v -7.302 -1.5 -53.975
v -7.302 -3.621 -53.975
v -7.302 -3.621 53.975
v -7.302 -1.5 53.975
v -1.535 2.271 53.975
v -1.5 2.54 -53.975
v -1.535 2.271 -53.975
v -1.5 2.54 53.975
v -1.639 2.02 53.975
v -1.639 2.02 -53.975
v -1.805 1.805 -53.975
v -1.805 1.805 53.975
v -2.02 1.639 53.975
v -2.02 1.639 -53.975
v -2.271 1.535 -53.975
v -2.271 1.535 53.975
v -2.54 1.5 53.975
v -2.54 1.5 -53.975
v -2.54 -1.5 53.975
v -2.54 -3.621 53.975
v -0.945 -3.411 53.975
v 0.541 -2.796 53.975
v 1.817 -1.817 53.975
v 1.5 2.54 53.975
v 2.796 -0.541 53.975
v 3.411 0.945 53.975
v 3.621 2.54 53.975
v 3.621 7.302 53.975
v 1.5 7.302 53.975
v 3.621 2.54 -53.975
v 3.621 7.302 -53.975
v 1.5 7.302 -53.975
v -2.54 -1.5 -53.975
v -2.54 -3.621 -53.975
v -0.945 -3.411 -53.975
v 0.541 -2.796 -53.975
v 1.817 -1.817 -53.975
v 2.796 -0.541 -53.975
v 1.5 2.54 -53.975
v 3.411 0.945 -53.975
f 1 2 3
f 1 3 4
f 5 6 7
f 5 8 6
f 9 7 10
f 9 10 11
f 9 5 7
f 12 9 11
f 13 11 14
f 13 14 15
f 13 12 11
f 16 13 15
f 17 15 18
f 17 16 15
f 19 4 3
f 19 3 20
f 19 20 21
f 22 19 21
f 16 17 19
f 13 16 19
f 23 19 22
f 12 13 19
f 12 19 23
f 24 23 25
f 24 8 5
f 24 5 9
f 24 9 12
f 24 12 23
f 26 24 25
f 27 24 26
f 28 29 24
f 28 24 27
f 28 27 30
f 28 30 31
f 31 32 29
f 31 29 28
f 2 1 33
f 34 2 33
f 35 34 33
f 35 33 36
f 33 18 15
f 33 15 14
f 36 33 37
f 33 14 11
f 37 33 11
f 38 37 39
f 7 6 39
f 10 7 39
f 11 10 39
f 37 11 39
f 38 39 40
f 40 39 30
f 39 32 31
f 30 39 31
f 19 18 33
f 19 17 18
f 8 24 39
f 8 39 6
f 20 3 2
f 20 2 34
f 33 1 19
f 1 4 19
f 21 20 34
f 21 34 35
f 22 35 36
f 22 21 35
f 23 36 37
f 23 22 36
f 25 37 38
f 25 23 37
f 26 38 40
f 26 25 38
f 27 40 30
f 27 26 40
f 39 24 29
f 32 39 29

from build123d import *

# Parameters (mm, degrees)
SKETCH7_W           = 4.7625
SKETCH7_H           = 2.12122512
BOSS_EXTRUDE2_DEPTH = 53.975
SKETCH8_W           = 2.12122512
SKETCH8_H           = 4.7625
BOSS_EXTRUDE3_DEPTH = 53.975
BOSS_EXTRUDE4_DEPTH = 53.975


with BuildPart() as part:
    # Sketch7 → Boss-Extrude2 (new, symmetric)
    with BuildSketch(Plane.XY):
        with Locations((-4.92125, -2.560612608)):
            Rectangle(SKETCH7_W, SKETCH7_H)
    extrude(amount=BOSS_EXTRUDE2_DEPTH, both=True)



with BuildPart() as body_2:
    # Sketch8 → Boss-Extrude3 (new, symmetric)
    with BuildSketch(Plane.XY):
        with Locations((2.560612608, 4.92125)):
            Rectangle(SKETCH8_W, SKETCH8_H)
    extrude(amount=BOSS_EXTRUDE3_DEPTH, both=True)


with BuildPart() as part_1:
    add(part.part)

    add(body_2.part)  # Boss-Extrude4 merges body 2
    # Sketch11 → Boss-Extrude4 (add, symmetric)
    with BuildSketch(Plane.XY):
        with BuildLine():
            Line((-2.54, -1.500000048), (-7.3025, -1.500000048))
            Line((-7.3025, -1.500000048), (-7.3025, -3.621225168))
            Line((-7.3025, -3.621225168), (-2.54, -3.621225168))
            ThreePointArc((-2.54, -3.621225168), (1.816644097, -1.816644097), (3.621225168, 2.54))
            Line((3.621225168, 2.54), (3.621225168, 7.3025))
            Line((3.621225168, 7.3025), (1.500000048, 7.3025))
            Line((1.500000048, 7.3025), (1.500000048, 2.54))
            Line((1.500000048, 2.54), (-1.500000048, 2.54))
            ThreePointArc((-1.500000048, 2.54), (-1.804608982, 1.804608982), (-2.54, 1.500000048))
            Line((-2.54, 1.500000048), (-2.54, -1.500000048))
        make_face()
    extrude(amount=BOSS_EXTRUDE4_DEPTH, both=True)


solid = part_1.part
